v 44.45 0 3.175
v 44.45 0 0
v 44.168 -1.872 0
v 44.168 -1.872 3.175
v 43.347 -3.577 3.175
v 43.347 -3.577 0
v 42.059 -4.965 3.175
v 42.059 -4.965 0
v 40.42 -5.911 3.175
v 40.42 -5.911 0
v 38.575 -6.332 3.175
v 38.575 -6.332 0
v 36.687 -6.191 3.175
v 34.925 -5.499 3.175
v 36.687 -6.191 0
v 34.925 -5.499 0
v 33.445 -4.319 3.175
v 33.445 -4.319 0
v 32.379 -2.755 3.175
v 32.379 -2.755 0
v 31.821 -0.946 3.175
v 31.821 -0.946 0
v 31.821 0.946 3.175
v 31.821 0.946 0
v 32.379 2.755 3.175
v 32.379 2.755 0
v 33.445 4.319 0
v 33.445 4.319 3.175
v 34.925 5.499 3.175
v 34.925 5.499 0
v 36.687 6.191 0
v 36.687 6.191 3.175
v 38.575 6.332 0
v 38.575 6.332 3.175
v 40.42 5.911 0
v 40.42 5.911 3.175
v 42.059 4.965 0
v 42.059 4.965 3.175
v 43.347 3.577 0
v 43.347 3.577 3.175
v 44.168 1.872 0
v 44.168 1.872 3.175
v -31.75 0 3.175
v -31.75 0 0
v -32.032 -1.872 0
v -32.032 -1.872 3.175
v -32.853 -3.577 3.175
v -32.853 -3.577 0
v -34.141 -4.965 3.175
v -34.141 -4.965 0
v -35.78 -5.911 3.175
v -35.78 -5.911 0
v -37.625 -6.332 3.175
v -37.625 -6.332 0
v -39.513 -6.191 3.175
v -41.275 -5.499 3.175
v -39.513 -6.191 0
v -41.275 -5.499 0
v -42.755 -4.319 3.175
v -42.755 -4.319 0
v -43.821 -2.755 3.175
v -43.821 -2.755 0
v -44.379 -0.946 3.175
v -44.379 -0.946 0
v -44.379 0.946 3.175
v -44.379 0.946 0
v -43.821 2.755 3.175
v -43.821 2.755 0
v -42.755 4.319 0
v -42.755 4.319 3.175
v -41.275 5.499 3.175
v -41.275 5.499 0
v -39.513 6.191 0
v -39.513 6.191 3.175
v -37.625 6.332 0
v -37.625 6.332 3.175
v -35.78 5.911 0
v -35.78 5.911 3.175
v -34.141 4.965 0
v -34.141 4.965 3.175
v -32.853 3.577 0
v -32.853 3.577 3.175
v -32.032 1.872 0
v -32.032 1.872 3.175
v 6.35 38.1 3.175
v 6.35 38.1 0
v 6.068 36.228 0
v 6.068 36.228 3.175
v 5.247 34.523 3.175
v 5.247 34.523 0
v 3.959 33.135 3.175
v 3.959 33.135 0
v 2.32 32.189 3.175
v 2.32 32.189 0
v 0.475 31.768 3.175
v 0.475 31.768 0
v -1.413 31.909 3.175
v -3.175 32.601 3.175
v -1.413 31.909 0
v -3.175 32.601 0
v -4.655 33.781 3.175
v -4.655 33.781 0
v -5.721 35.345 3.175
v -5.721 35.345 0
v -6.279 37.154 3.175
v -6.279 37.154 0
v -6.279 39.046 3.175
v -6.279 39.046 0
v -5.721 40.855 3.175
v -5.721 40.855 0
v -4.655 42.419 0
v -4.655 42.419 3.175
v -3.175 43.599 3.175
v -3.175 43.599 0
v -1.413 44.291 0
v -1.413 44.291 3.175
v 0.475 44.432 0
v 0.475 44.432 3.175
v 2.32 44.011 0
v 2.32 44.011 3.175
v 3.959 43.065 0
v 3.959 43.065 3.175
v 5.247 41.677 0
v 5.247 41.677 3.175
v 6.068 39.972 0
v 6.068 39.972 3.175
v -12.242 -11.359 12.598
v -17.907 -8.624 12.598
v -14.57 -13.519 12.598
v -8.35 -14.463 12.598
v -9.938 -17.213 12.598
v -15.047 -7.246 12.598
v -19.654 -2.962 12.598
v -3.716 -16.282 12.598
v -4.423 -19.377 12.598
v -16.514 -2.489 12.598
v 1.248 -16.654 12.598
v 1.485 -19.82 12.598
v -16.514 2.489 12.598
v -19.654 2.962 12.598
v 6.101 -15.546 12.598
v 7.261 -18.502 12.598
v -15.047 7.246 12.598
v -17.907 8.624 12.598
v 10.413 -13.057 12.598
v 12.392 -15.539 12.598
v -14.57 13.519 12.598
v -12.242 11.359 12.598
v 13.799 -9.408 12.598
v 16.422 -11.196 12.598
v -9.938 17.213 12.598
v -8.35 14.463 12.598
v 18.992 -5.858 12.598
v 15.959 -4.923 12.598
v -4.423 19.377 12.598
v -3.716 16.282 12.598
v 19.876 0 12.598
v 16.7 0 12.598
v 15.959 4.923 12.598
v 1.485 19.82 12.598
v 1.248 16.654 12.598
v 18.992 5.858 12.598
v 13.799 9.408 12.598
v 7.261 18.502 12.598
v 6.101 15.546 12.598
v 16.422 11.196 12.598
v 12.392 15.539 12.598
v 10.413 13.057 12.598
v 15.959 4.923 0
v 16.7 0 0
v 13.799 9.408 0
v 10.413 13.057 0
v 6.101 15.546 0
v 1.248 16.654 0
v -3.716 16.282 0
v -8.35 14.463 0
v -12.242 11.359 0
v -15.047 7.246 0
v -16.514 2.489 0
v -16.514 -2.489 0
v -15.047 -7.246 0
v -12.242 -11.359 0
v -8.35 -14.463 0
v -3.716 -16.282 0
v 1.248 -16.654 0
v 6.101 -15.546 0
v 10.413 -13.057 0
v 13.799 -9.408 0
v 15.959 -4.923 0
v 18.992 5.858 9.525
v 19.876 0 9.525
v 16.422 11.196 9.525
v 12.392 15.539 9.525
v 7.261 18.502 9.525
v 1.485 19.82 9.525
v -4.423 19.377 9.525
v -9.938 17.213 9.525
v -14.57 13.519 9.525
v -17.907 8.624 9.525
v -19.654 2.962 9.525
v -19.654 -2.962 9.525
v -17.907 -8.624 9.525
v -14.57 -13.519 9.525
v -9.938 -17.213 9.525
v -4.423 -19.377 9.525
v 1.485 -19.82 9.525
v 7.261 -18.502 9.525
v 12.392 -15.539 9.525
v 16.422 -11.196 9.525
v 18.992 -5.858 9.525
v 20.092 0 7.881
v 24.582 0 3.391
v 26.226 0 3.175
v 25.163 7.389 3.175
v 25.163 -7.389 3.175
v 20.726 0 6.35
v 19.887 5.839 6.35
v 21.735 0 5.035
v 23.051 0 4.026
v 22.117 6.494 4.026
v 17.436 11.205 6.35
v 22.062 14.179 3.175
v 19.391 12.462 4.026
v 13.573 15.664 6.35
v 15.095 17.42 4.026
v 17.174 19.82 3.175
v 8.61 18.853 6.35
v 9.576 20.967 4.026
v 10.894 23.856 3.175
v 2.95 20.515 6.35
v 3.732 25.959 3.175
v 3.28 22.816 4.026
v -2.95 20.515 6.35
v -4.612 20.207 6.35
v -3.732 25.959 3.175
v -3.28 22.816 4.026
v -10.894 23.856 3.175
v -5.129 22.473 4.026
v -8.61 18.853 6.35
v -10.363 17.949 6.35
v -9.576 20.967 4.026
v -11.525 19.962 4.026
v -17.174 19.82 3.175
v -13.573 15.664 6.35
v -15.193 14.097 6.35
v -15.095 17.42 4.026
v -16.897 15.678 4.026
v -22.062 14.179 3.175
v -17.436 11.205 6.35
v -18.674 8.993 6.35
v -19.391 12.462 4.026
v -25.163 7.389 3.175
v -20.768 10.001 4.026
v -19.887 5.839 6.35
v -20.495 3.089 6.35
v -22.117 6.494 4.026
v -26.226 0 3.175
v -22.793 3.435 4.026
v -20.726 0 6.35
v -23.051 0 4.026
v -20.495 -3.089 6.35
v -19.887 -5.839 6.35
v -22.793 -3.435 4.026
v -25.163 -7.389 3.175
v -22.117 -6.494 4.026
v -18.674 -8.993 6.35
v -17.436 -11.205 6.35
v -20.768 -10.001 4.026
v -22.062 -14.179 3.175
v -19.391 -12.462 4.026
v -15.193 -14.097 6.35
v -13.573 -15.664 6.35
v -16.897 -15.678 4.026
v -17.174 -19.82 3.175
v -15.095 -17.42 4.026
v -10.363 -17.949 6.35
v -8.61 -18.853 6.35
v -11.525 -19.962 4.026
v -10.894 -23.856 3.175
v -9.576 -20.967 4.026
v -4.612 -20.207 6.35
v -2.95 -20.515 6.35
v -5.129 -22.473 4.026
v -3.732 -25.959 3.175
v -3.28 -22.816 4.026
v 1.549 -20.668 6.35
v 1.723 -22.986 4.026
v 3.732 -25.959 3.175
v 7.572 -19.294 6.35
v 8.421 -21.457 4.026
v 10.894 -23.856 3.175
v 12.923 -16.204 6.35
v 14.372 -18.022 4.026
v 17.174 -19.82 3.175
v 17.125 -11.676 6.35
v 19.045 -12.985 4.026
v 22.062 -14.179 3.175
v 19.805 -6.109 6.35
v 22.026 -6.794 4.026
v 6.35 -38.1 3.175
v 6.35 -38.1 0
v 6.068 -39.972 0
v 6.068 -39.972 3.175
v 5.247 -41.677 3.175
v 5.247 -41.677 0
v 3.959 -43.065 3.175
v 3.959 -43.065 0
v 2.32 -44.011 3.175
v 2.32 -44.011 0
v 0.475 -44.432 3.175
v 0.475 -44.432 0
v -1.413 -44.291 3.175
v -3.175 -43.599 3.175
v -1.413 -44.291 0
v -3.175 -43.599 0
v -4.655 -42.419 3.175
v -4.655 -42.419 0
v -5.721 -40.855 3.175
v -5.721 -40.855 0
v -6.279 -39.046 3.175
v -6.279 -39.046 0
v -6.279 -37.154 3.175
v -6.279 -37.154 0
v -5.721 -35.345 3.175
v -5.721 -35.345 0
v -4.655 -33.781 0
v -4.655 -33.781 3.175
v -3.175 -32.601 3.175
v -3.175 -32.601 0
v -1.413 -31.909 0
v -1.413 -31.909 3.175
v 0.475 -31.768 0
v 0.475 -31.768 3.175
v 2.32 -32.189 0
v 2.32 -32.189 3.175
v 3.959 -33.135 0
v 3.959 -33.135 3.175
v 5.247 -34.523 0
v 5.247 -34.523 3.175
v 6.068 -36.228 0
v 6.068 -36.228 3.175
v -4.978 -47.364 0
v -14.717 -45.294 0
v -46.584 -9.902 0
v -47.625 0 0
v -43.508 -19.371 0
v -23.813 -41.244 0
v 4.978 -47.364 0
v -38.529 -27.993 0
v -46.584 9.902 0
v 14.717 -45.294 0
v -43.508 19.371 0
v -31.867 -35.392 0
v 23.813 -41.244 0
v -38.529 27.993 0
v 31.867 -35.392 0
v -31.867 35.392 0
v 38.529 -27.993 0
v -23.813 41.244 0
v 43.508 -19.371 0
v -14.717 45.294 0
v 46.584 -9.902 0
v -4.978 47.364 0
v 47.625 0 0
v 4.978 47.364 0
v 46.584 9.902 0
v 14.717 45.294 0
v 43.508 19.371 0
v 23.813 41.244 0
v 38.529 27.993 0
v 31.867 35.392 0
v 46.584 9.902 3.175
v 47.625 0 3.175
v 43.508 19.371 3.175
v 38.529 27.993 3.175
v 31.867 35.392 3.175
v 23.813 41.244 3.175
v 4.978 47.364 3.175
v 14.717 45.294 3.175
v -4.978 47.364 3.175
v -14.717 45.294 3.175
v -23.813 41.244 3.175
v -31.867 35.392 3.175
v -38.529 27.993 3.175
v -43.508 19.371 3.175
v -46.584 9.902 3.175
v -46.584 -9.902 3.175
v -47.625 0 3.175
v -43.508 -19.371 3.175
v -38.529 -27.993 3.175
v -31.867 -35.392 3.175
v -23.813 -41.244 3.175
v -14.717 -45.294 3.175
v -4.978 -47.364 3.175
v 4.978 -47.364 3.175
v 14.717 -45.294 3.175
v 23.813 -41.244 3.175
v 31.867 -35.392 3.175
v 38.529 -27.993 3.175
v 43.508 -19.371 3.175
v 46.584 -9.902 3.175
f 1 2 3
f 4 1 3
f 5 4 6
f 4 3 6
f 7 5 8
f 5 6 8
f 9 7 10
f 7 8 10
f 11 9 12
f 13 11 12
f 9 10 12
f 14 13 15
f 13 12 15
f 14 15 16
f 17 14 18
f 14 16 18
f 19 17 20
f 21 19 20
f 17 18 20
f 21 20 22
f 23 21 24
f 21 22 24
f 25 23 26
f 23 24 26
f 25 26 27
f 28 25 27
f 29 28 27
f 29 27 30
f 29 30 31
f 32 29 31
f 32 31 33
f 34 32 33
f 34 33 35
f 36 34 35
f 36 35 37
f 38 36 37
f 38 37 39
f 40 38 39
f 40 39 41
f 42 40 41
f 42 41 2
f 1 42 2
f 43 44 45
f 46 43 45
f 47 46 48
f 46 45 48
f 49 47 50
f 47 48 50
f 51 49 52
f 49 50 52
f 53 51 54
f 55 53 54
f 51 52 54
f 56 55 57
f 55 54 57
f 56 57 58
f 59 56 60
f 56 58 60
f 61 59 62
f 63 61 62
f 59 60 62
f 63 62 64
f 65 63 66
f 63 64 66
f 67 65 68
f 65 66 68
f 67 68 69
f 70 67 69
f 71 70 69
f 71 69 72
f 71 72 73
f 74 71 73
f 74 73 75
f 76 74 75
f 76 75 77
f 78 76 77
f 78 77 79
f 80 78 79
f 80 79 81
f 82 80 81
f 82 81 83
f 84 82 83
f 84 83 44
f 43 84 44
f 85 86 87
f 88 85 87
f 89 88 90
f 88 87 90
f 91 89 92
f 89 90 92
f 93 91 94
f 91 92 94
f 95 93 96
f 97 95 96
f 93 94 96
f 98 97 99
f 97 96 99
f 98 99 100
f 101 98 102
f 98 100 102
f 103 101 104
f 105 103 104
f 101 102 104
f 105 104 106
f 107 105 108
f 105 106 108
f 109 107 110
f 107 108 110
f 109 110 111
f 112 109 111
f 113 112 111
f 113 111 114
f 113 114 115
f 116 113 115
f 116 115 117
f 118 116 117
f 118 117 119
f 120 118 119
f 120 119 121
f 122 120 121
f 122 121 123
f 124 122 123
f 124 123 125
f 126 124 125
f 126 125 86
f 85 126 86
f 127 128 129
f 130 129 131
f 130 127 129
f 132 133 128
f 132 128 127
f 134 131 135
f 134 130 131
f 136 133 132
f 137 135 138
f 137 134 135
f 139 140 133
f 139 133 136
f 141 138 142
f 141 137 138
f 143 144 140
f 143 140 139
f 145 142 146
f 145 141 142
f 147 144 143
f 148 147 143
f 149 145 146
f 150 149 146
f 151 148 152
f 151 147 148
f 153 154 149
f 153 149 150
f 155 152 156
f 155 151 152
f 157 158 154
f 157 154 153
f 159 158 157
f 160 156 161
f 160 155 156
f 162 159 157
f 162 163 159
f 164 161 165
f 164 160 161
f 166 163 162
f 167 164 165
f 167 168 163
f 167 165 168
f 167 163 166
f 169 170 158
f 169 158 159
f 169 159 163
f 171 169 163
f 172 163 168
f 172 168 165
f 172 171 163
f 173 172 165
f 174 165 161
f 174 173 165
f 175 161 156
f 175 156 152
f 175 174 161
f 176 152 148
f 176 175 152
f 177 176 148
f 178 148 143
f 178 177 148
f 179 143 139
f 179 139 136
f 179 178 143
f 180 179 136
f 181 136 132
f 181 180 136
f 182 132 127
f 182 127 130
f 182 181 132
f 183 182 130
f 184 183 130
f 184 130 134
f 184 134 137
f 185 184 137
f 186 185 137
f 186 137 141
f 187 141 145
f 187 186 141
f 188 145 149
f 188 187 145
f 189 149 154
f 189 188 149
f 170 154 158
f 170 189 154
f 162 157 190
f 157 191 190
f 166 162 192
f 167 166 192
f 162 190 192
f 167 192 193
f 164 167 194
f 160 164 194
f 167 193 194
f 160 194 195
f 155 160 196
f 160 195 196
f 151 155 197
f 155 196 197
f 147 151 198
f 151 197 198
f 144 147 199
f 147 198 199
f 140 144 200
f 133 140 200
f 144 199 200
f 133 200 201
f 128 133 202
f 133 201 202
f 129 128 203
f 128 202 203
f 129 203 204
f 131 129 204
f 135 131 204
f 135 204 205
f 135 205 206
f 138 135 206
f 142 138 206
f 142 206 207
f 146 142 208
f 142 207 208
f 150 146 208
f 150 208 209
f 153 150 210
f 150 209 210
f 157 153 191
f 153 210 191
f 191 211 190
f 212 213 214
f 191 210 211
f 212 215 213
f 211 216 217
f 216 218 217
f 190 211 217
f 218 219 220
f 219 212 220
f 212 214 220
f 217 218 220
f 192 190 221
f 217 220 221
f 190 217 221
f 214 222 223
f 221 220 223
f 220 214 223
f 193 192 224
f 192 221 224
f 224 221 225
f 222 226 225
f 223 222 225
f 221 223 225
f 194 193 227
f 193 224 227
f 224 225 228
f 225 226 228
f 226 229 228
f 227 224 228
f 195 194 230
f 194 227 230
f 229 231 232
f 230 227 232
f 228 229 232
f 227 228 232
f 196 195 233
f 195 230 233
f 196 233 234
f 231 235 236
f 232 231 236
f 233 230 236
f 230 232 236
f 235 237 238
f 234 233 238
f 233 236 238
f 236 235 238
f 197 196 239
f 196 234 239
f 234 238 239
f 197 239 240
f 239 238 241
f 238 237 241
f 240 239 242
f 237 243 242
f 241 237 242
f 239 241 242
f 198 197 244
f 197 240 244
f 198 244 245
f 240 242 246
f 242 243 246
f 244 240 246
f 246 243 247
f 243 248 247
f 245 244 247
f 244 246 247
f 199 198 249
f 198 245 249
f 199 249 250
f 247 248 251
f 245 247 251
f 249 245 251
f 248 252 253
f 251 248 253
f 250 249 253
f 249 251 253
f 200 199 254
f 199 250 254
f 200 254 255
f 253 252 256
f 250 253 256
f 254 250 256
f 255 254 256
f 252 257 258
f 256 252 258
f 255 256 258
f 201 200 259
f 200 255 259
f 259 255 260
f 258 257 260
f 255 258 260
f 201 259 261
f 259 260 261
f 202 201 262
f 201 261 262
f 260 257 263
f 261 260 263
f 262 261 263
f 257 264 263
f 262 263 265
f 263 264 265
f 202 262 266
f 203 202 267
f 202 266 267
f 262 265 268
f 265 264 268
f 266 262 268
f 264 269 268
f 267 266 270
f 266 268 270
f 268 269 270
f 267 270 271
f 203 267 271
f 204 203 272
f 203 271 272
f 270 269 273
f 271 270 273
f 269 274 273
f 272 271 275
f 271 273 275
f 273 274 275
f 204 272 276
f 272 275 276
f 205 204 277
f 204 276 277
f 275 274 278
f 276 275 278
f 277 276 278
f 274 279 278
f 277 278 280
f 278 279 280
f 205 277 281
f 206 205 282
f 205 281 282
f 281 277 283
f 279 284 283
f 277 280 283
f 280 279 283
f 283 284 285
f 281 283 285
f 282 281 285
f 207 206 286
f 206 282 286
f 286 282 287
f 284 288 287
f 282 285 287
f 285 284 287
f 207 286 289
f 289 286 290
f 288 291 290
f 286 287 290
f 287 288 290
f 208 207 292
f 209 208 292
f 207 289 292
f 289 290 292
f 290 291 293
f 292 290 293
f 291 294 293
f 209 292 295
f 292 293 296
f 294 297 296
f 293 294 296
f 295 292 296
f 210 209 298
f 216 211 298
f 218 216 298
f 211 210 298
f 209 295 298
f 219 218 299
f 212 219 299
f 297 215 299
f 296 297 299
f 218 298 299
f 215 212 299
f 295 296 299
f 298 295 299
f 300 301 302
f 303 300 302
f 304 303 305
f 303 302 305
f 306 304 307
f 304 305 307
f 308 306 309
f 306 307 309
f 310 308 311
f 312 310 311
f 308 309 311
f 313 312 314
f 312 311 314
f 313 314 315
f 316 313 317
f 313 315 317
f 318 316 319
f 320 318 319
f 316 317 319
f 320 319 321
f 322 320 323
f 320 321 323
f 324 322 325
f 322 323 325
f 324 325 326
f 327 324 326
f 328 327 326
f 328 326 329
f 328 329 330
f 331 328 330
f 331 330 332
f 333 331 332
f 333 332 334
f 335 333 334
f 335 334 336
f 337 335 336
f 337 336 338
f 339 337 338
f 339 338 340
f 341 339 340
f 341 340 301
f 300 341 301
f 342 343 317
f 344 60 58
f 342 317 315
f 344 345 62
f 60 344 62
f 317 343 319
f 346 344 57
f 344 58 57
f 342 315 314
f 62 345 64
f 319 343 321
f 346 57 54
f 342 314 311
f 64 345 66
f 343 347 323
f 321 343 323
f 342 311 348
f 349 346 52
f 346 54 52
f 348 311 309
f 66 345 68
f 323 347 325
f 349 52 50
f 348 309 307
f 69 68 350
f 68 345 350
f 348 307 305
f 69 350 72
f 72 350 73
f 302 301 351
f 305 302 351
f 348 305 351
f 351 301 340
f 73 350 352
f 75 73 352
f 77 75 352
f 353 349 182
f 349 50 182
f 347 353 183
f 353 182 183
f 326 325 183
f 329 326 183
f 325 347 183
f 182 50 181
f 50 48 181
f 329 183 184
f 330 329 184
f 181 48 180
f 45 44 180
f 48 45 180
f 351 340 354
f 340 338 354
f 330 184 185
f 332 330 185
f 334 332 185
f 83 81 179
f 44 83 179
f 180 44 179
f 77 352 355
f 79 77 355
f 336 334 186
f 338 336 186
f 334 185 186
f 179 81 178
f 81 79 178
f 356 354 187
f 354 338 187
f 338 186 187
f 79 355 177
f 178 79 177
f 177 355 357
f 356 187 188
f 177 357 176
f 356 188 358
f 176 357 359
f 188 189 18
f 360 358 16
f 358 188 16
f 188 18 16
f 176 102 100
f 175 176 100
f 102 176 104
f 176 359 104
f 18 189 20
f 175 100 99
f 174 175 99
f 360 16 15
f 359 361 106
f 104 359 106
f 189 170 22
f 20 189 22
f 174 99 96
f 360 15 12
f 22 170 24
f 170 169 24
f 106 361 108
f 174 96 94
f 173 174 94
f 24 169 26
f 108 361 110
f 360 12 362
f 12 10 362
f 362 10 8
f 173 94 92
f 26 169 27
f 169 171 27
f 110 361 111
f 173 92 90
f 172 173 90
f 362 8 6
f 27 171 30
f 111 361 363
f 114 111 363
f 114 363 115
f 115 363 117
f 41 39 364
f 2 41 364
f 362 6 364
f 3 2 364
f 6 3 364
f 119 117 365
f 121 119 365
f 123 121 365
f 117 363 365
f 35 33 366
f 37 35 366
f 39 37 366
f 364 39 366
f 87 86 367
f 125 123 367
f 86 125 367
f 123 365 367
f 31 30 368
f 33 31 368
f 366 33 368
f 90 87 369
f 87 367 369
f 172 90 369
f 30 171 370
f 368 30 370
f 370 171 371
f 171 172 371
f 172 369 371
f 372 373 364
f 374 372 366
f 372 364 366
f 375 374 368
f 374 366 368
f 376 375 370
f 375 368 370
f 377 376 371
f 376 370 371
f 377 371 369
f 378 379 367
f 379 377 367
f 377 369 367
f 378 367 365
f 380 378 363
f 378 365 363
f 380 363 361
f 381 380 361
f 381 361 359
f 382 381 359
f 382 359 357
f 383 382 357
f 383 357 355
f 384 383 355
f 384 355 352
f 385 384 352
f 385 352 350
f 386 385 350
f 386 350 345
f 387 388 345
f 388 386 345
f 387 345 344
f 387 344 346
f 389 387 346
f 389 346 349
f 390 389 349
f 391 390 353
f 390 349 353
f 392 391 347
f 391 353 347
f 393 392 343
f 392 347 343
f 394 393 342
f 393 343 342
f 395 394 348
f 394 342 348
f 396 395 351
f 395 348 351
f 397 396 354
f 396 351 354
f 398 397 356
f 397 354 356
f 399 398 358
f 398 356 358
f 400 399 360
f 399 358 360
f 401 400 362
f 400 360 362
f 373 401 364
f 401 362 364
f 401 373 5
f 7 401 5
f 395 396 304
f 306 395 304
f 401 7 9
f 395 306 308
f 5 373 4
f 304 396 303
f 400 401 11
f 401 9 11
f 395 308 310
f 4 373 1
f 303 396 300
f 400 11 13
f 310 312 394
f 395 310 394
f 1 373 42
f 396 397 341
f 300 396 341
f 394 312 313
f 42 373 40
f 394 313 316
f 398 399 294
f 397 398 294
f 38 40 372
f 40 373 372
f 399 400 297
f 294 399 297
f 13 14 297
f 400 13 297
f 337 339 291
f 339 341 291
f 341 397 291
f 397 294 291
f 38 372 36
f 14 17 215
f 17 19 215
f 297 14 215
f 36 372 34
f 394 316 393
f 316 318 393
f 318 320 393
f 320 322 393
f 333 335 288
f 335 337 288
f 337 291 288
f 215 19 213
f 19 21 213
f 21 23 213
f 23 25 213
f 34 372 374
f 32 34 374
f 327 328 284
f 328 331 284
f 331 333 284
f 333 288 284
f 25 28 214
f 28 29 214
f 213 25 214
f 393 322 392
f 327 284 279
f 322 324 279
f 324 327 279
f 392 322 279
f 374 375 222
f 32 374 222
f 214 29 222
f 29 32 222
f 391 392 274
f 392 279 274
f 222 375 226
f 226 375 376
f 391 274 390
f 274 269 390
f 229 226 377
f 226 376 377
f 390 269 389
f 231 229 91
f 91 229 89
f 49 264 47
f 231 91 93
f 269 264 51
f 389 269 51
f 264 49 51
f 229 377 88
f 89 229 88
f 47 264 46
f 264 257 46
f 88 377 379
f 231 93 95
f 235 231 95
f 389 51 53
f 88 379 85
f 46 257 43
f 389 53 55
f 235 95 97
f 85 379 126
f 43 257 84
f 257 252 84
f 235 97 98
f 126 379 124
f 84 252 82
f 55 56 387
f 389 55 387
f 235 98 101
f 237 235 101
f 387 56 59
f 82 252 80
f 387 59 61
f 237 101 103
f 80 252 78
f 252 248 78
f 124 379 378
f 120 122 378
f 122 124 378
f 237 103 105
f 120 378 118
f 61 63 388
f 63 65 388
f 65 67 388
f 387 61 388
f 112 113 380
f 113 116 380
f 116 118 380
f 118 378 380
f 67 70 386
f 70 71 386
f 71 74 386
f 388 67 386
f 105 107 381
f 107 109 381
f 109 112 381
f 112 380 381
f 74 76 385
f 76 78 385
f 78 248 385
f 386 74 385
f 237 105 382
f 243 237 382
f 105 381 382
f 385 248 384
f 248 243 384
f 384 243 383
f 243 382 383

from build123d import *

# Parameters (mm, degrees)
F0_R     = 47.625
F0_R_2   = 16.7005
F1_DEPTH = 12.5984
F4_R     = 6.35
F5_DEPTH = 12.5994


with BuildPart() as f1:
    # F0 (on Top) → F1 (new body)
    with BuildSketch(Plane.XY):
        Circle(F0_R)
        Circle(F0_R_2, mode=Mode.SUBTRACT)
    extrude(amount=F1_DEPTH)

    # F2 (on Front) → F3 (revolve, cut)
    with BuildSketch(Plane.XZ):
        with BuildLine():
            Line((50.8, 3.175), (50.8, 12.5984))
            Line((50.8, 12.5984), (19.8755, 12.5984))
            Line((19.8755, 12.5984), (19.8755, 9.525))
            ThreePointArc((19.8755, 9.525), (21.735372, 5.034872), (26.2255, 3.175))
            Line((26.2255, 3.175), (50.8, 3.175))
        make_face()
    revolve(axis=Axis((0, 0, 6.2992), (0, 0, 1)), mode=Mode.SUBTRACT)

    # F4 (on face) → F5 (cut, through all)
    with BuildSketch(Plane(origin=(0, 0, 0), x_dir=(1, 0, 0), z_dir=(0, 0, -1))):
        with Locations((0, 38.1)):
            Circle(F4_R)
        with Locations((0, -38.1)):
            Circle(F4_R)
        with Locations((-38.1, 0)):
            Circle(F4_R)
        with Locations((38.1, 0)):
            Circle(F4_R)
    extrude(amount=-F5_DEPTH, mode=Mode.SUBTRACT)


solid = f1.part
